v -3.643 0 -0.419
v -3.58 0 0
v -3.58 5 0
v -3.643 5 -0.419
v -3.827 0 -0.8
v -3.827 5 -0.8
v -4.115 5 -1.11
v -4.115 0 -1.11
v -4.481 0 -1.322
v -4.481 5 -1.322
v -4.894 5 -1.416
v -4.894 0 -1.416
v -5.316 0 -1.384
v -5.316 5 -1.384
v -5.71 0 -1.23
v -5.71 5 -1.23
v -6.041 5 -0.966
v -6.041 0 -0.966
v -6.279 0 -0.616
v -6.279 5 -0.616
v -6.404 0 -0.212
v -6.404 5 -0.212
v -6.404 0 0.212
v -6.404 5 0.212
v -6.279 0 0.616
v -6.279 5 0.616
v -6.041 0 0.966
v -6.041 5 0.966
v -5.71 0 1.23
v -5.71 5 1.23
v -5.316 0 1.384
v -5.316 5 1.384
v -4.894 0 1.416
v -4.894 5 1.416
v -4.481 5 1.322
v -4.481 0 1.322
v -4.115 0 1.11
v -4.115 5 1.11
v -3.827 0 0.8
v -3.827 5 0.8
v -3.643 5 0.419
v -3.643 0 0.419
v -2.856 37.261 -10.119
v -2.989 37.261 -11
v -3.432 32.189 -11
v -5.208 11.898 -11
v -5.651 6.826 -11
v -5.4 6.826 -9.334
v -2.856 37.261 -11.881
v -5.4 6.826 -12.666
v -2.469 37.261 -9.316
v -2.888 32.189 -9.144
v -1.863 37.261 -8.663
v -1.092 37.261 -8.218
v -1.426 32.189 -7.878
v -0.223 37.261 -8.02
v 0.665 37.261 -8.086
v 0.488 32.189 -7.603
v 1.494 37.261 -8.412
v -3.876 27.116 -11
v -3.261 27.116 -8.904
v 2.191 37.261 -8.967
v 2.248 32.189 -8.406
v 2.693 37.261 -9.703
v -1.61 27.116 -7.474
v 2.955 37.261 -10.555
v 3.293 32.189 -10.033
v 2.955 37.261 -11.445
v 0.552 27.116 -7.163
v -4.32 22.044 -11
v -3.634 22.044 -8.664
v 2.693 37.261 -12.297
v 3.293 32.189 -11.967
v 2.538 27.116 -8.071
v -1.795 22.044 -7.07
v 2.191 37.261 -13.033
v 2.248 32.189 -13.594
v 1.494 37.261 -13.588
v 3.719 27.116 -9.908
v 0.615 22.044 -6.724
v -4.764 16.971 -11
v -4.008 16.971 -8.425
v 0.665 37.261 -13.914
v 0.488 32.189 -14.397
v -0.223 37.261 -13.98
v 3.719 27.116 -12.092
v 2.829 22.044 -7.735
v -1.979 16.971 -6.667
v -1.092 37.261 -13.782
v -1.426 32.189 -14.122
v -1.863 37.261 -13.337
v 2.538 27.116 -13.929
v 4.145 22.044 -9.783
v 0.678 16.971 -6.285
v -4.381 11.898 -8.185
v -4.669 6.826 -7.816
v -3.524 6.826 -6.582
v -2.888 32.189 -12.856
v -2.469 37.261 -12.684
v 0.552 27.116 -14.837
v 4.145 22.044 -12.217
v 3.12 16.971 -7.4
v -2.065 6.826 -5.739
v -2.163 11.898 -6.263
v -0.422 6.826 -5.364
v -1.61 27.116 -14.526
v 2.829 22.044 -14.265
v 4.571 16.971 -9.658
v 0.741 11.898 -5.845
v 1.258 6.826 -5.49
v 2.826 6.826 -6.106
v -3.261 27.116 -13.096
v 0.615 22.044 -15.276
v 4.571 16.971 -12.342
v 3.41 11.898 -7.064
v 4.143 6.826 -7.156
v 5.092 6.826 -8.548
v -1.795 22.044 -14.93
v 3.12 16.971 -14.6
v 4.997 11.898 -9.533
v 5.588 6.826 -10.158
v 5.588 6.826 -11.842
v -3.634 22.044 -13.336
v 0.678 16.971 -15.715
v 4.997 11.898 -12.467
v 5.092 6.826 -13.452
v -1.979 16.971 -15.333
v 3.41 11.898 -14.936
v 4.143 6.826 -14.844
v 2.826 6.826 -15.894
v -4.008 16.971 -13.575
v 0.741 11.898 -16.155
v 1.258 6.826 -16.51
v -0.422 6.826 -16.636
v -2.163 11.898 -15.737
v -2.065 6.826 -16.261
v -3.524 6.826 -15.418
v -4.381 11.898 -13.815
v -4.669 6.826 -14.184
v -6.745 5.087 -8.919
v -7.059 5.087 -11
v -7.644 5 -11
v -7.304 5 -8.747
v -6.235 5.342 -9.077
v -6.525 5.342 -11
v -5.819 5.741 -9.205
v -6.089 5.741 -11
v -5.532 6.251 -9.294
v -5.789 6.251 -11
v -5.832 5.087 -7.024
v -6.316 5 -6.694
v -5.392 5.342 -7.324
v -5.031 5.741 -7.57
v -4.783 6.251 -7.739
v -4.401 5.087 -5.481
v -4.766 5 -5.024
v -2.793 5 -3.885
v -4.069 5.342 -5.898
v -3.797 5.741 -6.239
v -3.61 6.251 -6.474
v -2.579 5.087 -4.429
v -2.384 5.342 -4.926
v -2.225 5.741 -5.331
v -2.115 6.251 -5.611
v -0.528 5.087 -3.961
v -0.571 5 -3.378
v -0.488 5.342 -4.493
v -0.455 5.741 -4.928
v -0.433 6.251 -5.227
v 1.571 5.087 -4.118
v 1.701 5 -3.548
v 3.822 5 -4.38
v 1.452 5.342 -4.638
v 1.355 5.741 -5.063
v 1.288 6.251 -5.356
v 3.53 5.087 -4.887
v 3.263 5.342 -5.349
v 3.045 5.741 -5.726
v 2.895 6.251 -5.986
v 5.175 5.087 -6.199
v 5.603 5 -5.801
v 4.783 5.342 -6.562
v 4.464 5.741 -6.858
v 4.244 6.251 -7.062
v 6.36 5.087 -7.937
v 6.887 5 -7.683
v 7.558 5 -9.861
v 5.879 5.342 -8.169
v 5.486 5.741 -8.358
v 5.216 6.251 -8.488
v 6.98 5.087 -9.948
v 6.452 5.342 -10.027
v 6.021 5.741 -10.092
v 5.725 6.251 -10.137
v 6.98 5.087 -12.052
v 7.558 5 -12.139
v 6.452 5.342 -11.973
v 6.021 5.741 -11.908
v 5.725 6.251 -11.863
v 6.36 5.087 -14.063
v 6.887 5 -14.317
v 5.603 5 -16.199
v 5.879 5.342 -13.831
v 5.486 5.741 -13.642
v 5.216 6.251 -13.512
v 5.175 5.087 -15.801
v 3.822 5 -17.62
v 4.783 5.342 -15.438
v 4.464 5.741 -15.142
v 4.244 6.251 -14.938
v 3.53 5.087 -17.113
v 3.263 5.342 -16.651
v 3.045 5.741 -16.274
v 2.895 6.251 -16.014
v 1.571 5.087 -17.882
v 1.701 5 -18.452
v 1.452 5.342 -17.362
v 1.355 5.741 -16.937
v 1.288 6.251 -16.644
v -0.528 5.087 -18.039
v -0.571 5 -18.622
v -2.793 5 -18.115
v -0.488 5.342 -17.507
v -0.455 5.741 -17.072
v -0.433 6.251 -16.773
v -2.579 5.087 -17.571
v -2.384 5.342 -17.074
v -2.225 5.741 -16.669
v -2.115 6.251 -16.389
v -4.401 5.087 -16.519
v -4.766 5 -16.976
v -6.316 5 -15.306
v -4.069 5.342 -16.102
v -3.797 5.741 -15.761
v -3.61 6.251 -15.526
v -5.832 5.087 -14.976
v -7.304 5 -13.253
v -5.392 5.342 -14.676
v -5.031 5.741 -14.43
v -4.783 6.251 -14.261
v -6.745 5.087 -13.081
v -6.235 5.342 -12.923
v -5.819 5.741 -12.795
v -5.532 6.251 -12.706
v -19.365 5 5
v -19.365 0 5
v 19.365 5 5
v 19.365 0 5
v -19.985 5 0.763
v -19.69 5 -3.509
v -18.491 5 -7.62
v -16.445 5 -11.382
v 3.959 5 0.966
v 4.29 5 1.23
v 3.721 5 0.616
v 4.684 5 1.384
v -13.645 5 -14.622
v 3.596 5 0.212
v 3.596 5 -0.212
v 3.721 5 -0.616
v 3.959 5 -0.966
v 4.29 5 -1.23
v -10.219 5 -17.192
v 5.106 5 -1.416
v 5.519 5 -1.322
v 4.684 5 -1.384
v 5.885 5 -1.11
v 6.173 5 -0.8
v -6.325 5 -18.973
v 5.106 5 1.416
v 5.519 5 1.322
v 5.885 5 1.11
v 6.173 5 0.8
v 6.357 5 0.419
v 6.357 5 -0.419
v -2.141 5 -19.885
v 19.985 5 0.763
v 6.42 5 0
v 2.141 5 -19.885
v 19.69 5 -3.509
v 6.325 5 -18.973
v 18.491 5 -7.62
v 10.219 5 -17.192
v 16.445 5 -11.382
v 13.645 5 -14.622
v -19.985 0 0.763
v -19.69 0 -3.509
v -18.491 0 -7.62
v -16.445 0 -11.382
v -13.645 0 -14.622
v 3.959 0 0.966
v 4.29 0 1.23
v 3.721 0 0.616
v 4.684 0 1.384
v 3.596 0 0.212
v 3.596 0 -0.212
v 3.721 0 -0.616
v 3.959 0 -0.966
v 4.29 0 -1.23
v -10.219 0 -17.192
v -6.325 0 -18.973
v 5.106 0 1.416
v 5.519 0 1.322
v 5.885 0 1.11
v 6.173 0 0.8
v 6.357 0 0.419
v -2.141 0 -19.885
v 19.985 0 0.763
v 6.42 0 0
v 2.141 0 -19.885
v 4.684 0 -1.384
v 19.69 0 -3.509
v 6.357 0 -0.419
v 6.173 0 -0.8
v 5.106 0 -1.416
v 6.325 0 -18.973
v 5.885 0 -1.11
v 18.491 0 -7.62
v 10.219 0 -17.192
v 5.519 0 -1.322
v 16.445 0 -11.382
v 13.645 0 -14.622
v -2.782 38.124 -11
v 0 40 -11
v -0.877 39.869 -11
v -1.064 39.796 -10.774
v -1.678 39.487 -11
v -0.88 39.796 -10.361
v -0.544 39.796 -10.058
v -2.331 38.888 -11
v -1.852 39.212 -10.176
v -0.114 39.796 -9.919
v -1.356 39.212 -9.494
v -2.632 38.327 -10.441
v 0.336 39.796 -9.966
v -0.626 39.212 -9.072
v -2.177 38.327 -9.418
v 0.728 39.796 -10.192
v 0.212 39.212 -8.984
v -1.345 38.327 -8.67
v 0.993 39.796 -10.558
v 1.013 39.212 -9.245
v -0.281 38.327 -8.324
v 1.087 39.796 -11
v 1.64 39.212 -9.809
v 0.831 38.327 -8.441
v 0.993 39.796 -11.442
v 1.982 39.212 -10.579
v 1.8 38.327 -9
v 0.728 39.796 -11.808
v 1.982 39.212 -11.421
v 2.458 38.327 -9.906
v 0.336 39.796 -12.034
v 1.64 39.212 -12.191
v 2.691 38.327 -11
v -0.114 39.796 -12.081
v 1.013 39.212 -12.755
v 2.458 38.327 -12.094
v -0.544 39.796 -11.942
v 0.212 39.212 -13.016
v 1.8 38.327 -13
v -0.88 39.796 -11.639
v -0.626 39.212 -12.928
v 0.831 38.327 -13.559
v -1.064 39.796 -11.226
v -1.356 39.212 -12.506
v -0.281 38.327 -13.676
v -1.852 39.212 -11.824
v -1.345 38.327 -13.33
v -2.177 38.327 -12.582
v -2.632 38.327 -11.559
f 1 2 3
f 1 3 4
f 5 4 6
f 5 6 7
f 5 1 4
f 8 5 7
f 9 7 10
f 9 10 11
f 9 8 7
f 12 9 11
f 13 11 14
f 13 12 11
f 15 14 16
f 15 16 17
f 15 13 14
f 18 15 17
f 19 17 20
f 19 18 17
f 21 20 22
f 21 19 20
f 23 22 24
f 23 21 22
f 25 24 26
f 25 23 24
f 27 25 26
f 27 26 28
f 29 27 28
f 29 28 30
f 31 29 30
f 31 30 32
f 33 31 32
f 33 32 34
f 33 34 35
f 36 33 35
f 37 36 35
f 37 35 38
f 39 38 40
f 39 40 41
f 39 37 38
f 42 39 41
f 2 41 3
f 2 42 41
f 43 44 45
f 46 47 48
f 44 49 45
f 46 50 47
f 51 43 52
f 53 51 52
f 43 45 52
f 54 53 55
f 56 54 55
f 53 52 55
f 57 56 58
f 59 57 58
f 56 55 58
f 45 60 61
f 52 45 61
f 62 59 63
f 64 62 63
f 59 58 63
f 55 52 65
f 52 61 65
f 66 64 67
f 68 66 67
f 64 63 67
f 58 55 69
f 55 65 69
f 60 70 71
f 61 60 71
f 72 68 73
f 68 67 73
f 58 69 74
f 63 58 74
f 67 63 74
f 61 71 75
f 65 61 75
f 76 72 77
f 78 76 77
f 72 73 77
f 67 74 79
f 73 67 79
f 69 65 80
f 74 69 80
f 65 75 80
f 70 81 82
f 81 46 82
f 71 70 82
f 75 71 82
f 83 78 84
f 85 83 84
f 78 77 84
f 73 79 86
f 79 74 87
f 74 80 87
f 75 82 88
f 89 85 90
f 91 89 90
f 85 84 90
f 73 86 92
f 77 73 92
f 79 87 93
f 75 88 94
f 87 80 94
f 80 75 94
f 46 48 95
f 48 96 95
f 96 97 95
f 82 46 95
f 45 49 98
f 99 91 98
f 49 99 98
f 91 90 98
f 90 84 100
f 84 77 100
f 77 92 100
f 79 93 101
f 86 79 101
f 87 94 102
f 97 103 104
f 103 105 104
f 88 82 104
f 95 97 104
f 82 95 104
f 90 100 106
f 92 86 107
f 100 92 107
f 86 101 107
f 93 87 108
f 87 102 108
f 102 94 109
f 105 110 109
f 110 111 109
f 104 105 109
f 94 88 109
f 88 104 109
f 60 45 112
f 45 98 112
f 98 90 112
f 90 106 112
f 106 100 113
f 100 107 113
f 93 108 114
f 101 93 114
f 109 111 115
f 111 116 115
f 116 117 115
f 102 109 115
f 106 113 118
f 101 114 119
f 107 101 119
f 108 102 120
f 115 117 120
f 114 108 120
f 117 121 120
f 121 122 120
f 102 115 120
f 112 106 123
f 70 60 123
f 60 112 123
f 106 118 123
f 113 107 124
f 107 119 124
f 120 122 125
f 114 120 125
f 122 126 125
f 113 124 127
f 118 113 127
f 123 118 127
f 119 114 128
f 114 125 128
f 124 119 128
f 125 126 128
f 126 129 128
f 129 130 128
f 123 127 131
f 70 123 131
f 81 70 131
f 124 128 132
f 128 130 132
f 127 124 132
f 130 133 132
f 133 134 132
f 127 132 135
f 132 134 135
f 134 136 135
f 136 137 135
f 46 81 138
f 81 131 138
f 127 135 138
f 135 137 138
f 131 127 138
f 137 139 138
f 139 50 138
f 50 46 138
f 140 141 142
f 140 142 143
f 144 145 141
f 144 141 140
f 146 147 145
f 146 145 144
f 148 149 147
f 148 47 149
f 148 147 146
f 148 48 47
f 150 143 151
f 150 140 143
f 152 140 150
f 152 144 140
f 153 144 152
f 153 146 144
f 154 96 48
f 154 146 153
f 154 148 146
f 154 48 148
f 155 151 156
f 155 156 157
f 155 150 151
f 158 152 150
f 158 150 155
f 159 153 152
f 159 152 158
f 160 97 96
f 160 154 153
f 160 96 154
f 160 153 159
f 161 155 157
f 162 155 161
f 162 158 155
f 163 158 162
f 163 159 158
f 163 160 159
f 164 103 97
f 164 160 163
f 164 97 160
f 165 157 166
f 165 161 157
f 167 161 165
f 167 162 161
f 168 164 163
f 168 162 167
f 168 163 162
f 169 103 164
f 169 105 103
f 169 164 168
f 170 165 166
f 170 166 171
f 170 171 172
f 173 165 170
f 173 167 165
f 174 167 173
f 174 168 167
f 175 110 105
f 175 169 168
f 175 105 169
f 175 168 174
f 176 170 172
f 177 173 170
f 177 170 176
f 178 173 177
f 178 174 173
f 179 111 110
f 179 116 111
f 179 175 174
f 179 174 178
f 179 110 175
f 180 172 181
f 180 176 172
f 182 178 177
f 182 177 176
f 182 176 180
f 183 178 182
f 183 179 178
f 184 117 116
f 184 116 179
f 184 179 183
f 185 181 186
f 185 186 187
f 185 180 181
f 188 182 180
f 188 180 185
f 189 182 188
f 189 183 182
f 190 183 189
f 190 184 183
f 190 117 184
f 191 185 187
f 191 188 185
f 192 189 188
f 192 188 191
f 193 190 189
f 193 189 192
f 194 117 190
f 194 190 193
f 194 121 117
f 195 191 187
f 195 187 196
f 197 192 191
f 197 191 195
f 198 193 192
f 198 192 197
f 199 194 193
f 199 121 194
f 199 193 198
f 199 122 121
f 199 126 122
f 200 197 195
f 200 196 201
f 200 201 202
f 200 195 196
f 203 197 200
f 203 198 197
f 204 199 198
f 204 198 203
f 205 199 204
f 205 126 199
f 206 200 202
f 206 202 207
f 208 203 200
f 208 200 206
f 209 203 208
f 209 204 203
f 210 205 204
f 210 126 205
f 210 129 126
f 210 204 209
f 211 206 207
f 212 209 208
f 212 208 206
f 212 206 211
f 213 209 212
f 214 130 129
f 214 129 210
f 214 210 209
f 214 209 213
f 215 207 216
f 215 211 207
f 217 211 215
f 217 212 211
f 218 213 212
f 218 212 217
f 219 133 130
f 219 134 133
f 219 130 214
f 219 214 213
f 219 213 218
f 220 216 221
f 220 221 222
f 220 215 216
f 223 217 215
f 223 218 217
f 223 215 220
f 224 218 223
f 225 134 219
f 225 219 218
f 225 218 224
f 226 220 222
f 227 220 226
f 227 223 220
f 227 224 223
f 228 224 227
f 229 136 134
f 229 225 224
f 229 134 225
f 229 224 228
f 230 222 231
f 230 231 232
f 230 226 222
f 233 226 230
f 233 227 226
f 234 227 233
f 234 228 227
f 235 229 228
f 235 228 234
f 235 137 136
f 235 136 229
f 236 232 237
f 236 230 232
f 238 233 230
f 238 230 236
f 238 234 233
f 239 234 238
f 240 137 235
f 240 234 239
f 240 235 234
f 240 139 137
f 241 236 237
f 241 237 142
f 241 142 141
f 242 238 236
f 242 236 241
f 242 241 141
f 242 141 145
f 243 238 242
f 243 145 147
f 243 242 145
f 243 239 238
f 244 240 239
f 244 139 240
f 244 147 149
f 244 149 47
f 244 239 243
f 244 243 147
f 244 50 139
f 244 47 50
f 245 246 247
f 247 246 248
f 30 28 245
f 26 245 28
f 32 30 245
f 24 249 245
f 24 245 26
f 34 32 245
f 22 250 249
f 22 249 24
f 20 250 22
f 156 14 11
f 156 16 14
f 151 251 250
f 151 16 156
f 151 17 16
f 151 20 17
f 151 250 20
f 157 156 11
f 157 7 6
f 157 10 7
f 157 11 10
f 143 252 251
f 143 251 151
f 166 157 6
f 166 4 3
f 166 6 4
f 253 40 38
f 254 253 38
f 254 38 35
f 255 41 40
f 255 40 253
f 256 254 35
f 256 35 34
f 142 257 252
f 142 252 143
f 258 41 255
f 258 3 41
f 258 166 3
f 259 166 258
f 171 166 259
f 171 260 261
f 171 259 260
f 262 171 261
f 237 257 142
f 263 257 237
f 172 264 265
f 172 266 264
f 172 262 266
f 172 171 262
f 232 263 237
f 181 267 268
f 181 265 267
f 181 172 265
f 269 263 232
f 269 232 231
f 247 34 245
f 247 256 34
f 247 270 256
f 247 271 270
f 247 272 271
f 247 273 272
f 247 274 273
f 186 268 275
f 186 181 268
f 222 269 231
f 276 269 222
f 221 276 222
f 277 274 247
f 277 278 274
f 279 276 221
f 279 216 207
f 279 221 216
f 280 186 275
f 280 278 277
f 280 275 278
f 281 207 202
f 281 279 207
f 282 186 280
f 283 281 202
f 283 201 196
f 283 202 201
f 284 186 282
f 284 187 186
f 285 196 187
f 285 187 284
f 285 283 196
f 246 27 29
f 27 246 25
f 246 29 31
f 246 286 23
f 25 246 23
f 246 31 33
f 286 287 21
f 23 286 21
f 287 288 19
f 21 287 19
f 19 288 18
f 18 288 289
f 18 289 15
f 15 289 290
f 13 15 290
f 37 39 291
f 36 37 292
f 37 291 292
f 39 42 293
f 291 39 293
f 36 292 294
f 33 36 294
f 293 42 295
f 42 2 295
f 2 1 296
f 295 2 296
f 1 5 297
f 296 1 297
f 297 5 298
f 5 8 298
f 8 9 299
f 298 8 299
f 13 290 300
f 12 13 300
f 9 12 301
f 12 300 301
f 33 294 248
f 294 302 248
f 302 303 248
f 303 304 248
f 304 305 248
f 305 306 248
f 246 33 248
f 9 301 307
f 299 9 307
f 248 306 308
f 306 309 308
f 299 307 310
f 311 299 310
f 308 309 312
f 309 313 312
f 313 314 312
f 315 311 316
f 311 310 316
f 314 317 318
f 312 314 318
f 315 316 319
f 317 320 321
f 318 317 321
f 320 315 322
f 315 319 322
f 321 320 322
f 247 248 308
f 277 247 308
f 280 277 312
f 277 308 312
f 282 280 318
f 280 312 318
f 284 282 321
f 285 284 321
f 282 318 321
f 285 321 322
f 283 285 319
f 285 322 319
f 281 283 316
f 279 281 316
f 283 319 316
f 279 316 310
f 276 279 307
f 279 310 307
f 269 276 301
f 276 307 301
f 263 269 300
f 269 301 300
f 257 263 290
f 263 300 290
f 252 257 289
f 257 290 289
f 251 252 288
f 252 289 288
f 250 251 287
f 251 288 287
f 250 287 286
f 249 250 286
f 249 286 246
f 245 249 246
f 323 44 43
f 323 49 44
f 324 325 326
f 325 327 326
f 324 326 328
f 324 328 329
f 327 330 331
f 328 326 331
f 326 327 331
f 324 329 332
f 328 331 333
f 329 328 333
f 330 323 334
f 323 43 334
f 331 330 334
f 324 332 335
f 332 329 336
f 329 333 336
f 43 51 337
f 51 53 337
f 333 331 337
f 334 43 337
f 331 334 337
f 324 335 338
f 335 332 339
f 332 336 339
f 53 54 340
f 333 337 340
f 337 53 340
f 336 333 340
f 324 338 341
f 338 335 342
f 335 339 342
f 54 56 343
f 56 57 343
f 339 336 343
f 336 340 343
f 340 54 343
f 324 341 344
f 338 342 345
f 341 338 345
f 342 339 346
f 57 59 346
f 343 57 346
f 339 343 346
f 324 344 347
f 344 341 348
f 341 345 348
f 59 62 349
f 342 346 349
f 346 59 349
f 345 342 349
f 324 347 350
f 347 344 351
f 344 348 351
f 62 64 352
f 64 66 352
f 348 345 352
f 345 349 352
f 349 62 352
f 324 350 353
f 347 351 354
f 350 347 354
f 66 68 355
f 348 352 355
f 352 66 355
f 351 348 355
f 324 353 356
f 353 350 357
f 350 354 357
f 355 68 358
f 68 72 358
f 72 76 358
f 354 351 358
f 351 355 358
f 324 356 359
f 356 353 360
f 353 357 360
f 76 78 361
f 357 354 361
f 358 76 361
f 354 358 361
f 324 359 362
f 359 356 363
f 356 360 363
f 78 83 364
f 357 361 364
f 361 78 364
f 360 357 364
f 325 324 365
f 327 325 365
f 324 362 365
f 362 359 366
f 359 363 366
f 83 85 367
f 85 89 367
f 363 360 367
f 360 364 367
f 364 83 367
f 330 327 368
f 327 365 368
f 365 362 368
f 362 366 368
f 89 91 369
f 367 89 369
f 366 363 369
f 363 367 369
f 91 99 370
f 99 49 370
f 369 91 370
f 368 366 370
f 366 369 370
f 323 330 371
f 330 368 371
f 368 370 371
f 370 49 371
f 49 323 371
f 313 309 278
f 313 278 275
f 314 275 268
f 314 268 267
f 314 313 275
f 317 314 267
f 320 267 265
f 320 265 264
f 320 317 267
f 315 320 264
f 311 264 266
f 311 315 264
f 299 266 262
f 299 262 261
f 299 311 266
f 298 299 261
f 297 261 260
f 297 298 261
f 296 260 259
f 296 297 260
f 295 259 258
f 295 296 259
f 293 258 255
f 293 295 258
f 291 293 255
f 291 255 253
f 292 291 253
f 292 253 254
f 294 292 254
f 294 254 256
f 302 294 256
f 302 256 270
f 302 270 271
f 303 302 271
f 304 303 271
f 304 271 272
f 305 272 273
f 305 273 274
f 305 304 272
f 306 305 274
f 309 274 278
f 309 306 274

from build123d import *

# Parameters (mm, degrees)
SKETCH1_R           = 1.42
BOSS_EXTRUDE1_DEPTH = 5
FILLET1_R           = 2


with BuildPart() as part:
    # Sketch1 → Boss-Extrude1 (new body)
    with BuildSketch(Plane(origin=(0, 0, 0), x_dir=(1, 0, 0), z_dir=(0, 1, 0))):
        with BuildLine():
            Line((-19.364916731, -5), (19.364916731, -5))
            ThreePointArc((19.364916731, -5), (0, 20), (-19.364916731, -5))
        make_face()
        with Locations((-5, 0)):
            Circle(SKETCH1_R, mode=Mode.SUBTRACT)
        with Locations((5, 0)):
            Circle(SKETCH1_R, mode=Mode.SUBTRACT)
    extrude(amount=BOSS_EXTRUDE1_DEPTH)

    # Sketch2 → Revolve1 (revolve)
    with BuildSketch(Plane.XY.offset(-11)):
        with BuildLine():
            Line((0, 5), (0, 40))
            ThreePointArc((0, 40), (-2.026770623, 39.21183201), (-2.988584094, 37.261467228))
            Line((-2.988584094, 37.261467228), (-5.811096745, 5))
            Line((-5.811096745, 5), (0, 5))
        make_face()
    revolve(axis=Axis((0, 5, -11), (0, 1, 0)))

    # Fillet1
    fillet1_edges = [part.edges().sort_by_distance(p)[0] for p in [
        (5.811096745, 5, -11),
    ]]
    fillet(fillet1_edges, radius=FILLET1_R)


solid = part.part
